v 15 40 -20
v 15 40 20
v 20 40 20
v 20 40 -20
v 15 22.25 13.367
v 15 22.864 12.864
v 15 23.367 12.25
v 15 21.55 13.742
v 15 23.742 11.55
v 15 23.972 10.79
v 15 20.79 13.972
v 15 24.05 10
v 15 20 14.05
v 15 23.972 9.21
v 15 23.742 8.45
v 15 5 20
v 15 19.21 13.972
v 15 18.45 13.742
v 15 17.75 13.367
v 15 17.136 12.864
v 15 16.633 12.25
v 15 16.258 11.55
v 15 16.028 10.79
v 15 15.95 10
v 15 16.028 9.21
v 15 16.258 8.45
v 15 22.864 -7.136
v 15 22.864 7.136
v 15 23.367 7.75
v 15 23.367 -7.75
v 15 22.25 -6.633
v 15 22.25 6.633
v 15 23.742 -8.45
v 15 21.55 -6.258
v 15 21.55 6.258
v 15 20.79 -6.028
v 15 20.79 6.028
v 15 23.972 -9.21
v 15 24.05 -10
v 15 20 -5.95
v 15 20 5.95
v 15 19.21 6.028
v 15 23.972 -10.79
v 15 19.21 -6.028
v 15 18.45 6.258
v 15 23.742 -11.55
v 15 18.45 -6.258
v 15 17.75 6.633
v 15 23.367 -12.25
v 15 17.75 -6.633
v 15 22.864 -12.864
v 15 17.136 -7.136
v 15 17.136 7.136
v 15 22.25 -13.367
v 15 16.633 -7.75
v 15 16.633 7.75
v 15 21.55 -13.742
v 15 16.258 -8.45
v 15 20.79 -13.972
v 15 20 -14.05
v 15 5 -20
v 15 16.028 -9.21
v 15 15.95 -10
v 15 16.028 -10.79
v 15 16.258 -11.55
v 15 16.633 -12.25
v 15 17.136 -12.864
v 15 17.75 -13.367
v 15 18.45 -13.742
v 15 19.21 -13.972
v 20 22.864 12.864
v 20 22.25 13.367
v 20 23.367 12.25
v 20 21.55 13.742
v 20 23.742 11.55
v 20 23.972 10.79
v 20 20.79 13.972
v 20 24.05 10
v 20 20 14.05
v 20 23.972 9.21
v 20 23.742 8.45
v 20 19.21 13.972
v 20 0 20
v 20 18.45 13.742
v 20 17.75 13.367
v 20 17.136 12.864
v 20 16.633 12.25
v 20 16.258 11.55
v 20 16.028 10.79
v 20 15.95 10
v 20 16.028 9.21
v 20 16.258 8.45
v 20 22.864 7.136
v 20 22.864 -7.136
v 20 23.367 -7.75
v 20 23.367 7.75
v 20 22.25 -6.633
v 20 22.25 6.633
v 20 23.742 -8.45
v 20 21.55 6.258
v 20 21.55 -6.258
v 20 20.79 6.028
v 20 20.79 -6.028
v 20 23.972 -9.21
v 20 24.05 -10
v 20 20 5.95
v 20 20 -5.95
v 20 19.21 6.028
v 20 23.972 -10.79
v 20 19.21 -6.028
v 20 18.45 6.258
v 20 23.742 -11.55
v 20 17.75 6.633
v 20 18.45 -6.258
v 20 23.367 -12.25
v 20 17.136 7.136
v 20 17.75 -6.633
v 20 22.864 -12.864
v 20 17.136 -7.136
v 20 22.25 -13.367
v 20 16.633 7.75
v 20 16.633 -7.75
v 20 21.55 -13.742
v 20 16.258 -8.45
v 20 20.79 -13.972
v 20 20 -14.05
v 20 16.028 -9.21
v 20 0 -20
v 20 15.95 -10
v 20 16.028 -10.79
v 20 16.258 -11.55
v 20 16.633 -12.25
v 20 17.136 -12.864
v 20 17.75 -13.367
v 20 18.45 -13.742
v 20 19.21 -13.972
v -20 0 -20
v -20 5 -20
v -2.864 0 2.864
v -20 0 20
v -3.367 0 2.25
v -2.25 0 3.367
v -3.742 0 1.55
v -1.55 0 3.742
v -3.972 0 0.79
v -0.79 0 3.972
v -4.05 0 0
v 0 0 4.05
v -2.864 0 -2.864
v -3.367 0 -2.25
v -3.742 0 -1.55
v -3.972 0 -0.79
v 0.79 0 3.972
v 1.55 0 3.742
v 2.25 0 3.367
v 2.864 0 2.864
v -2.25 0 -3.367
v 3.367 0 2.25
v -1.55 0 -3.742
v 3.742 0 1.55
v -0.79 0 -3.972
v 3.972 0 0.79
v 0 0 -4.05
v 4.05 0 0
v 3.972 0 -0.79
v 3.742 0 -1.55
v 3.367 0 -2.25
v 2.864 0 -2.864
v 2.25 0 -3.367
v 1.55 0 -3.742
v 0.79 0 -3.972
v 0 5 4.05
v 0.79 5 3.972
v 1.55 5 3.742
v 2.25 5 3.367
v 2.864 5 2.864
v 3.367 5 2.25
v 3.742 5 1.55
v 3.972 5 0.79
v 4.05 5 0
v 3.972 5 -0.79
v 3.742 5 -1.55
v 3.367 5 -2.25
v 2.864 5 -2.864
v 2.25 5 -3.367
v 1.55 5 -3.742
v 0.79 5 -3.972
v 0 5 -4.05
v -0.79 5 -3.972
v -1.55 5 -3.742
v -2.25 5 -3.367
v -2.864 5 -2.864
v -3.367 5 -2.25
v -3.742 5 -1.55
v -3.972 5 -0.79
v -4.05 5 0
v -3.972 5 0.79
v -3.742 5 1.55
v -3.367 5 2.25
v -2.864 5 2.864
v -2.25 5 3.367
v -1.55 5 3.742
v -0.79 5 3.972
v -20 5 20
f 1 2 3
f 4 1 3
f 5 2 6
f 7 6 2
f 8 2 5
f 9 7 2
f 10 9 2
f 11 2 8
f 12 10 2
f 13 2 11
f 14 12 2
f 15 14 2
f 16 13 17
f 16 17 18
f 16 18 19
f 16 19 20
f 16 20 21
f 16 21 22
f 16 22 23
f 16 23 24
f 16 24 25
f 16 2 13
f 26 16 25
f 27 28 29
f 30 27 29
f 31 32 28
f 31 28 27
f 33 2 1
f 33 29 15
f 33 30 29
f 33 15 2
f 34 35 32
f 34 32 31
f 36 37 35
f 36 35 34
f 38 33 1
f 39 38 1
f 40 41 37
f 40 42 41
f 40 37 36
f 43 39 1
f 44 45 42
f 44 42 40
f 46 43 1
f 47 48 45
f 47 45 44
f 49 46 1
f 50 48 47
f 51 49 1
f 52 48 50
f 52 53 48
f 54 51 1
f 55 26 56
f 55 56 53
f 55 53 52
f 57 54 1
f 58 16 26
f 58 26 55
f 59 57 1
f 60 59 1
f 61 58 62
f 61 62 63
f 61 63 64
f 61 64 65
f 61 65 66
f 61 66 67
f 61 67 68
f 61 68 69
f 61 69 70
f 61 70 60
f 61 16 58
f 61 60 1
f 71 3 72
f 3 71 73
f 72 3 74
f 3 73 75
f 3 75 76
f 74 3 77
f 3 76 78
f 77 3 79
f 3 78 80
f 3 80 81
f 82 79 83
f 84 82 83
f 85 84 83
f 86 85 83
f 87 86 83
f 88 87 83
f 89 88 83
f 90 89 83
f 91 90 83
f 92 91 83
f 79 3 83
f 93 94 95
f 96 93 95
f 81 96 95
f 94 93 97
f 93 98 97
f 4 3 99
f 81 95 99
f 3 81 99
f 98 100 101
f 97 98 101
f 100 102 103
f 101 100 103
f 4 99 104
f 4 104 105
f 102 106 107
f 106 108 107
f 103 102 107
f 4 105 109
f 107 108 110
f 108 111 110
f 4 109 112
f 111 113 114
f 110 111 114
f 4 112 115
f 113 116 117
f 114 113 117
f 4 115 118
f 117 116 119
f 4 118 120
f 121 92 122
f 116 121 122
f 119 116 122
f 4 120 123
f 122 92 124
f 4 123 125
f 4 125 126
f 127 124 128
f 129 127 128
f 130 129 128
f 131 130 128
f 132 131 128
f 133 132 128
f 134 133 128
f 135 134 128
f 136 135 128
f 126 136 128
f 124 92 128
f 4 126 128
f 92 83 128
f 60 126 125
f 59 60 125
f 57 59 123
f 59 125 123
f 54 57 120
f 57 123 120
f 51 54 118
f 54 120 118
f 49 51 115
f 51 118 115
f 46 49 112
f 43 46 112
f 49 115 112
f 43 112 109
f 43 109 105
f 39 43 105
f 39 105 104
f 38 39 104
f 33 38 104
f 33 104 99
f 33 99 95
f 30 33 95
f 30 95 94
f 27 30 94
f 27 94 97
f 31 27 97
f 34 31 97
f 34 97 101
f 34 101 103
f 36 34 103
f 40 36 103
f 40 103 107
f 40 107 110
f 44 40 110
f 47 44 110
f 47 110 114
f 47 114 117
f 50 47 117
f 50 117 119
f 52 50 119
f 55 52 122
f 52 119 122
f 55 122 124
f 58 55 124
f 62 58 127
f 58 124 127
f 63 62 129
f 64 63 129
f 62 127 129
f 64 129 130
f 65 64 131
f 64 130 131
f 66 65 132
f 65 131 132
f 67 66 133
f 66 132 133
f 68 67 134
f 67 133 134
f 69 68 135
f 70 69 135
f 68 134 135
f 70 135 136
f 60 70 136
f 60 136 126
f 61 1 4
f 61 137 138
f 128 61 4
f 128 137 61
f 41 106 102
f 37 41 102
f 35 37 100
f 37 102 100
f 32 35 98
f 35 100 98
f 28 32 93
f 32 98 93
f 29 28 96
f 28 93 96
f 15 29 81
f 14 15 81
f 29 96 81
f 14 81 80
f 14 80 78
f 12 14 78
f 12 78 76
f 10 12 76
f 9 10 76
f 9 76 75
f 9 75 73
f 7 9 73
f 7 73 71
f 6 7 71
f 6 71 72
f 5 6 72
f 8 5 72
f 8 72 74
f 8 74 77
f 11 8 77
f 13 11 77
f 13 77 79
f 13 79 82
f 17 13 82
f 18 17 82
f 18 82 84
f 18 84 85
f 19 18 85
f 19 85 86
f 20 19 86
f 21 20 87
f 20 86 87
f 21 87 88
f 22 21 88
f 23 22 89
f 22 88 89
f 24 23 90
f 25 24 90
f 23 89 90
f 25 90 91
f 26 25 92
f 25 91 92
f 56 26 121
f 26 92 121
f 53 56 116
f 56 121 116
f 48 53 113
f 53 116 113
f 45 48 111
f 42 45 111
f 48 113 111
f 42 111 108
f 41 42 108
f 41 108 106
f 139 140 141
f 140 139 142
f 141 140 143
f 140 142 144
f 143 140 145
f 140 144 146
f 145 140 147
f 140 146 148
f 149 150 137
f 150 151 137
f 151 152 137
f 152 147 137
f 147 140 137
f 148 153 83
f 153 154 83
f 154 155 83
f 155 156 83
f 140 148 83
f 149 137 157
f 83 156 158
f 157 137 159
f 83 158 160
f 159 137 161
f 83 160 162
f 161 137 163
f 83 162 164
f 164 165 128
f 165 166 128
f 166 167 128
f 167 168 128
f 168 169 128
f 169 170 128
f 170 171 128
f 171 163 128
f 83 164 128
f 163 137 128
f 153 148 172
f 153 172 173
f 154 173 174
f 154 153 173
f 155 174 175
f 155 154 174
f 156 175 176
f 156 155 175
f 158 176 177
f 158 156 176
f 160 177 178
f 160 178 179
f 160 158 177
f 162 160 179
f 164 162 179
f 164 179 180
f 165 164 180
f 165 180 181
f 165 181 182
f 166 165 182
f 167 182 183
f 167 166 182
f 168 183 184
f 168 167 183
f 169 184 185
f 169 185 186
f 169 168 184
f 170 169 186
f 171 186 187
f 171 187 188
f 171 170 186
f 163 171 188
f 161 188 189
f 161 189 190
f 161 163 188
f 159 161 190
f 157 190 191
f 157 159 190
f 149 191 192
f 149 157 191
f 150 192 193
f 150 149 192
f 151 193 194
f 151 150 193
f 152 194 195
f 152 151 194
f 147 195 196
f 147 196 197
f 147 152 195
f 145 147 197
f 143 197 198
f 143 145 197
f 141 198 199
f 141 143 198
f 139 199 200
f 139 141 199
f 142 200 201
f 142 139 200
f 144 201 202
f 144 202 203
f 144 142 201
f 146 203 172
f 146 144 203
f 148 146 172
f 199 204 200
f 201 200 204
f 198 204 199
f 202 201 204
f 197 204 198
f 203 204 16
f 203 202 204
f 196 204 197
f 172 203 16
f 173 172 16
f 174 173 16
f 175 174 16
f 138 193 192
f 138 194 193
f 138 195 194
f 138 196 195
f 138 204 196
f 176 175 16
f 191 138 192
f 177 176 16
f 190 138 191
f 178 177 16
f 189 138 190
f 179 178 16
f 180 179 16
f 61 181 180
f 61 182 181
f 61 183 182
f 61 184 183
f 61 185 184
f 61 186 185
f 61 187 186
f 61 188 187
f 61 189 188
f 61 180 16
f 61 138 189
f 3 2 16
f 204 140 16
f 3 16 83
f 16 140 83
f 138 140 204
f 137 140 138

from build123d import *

# Parameters (mm, degrees)
SKETCH_1_W          = 40
SKETCH_1_H          = 40
SKETCH_1_R          = 4.05
EXTRUDE_1_DEPTH     = 5
SKETCH_2_W          = 5
SKETCH_2_H          = 40
EXTRUDE_2_DEPTH     = 35
SKETCH_3_R          = 4.05
CUT_EXTRUDE_1_DEPTH = 35


with BuildPart() as part:
    # 草图1 → 凸台-拉伸1 (new body)
    with BuildSketch(Plane(origin=(0, 0, 0), x_dir=(1, 0, 0), z_dir=(0, 1, 0))):
        Rectangle(SKETCH_1_W, SKETCH_1_H)
        with Locations(Location((0, 0, 0), (0, 0, 270))):
            Circle(SKETCH_1_R, mode=Mode.SUBTRACT)
    extrude(amount=EXTRUDE_1_DEPTH)

    # 草图2 → 凸台-拉伸2 (add)
    with BuildSketch(Plane(origin=(0, 5, 0), x_dir=(1, 0, 0), z_dir=(0, 1, 0))):
        with Locations((17.5, 0)):
            Rectangle(SKETCH_2_W, SKETCH_2_H)
    extrude(amount=EXTRUDE_2_DEPTH)

    # 草图3 → 切除-拉伸1 (cut)
    with BuildSketch(Plane(origin=(20, 0, 0), x_dir=(0, 0, -1), z_dir=(1, 0, 0))):
        with Locations((-10, 20)):
            Circle(SKETCH_3_R)
        with Locations((10, 20)):
            Circle(SKETCH_3_R)
    extrude(amount=-CUT_EXTRUDE_1_DEPTH, mode=Mode.SUBTRACT)


solid = part.part
